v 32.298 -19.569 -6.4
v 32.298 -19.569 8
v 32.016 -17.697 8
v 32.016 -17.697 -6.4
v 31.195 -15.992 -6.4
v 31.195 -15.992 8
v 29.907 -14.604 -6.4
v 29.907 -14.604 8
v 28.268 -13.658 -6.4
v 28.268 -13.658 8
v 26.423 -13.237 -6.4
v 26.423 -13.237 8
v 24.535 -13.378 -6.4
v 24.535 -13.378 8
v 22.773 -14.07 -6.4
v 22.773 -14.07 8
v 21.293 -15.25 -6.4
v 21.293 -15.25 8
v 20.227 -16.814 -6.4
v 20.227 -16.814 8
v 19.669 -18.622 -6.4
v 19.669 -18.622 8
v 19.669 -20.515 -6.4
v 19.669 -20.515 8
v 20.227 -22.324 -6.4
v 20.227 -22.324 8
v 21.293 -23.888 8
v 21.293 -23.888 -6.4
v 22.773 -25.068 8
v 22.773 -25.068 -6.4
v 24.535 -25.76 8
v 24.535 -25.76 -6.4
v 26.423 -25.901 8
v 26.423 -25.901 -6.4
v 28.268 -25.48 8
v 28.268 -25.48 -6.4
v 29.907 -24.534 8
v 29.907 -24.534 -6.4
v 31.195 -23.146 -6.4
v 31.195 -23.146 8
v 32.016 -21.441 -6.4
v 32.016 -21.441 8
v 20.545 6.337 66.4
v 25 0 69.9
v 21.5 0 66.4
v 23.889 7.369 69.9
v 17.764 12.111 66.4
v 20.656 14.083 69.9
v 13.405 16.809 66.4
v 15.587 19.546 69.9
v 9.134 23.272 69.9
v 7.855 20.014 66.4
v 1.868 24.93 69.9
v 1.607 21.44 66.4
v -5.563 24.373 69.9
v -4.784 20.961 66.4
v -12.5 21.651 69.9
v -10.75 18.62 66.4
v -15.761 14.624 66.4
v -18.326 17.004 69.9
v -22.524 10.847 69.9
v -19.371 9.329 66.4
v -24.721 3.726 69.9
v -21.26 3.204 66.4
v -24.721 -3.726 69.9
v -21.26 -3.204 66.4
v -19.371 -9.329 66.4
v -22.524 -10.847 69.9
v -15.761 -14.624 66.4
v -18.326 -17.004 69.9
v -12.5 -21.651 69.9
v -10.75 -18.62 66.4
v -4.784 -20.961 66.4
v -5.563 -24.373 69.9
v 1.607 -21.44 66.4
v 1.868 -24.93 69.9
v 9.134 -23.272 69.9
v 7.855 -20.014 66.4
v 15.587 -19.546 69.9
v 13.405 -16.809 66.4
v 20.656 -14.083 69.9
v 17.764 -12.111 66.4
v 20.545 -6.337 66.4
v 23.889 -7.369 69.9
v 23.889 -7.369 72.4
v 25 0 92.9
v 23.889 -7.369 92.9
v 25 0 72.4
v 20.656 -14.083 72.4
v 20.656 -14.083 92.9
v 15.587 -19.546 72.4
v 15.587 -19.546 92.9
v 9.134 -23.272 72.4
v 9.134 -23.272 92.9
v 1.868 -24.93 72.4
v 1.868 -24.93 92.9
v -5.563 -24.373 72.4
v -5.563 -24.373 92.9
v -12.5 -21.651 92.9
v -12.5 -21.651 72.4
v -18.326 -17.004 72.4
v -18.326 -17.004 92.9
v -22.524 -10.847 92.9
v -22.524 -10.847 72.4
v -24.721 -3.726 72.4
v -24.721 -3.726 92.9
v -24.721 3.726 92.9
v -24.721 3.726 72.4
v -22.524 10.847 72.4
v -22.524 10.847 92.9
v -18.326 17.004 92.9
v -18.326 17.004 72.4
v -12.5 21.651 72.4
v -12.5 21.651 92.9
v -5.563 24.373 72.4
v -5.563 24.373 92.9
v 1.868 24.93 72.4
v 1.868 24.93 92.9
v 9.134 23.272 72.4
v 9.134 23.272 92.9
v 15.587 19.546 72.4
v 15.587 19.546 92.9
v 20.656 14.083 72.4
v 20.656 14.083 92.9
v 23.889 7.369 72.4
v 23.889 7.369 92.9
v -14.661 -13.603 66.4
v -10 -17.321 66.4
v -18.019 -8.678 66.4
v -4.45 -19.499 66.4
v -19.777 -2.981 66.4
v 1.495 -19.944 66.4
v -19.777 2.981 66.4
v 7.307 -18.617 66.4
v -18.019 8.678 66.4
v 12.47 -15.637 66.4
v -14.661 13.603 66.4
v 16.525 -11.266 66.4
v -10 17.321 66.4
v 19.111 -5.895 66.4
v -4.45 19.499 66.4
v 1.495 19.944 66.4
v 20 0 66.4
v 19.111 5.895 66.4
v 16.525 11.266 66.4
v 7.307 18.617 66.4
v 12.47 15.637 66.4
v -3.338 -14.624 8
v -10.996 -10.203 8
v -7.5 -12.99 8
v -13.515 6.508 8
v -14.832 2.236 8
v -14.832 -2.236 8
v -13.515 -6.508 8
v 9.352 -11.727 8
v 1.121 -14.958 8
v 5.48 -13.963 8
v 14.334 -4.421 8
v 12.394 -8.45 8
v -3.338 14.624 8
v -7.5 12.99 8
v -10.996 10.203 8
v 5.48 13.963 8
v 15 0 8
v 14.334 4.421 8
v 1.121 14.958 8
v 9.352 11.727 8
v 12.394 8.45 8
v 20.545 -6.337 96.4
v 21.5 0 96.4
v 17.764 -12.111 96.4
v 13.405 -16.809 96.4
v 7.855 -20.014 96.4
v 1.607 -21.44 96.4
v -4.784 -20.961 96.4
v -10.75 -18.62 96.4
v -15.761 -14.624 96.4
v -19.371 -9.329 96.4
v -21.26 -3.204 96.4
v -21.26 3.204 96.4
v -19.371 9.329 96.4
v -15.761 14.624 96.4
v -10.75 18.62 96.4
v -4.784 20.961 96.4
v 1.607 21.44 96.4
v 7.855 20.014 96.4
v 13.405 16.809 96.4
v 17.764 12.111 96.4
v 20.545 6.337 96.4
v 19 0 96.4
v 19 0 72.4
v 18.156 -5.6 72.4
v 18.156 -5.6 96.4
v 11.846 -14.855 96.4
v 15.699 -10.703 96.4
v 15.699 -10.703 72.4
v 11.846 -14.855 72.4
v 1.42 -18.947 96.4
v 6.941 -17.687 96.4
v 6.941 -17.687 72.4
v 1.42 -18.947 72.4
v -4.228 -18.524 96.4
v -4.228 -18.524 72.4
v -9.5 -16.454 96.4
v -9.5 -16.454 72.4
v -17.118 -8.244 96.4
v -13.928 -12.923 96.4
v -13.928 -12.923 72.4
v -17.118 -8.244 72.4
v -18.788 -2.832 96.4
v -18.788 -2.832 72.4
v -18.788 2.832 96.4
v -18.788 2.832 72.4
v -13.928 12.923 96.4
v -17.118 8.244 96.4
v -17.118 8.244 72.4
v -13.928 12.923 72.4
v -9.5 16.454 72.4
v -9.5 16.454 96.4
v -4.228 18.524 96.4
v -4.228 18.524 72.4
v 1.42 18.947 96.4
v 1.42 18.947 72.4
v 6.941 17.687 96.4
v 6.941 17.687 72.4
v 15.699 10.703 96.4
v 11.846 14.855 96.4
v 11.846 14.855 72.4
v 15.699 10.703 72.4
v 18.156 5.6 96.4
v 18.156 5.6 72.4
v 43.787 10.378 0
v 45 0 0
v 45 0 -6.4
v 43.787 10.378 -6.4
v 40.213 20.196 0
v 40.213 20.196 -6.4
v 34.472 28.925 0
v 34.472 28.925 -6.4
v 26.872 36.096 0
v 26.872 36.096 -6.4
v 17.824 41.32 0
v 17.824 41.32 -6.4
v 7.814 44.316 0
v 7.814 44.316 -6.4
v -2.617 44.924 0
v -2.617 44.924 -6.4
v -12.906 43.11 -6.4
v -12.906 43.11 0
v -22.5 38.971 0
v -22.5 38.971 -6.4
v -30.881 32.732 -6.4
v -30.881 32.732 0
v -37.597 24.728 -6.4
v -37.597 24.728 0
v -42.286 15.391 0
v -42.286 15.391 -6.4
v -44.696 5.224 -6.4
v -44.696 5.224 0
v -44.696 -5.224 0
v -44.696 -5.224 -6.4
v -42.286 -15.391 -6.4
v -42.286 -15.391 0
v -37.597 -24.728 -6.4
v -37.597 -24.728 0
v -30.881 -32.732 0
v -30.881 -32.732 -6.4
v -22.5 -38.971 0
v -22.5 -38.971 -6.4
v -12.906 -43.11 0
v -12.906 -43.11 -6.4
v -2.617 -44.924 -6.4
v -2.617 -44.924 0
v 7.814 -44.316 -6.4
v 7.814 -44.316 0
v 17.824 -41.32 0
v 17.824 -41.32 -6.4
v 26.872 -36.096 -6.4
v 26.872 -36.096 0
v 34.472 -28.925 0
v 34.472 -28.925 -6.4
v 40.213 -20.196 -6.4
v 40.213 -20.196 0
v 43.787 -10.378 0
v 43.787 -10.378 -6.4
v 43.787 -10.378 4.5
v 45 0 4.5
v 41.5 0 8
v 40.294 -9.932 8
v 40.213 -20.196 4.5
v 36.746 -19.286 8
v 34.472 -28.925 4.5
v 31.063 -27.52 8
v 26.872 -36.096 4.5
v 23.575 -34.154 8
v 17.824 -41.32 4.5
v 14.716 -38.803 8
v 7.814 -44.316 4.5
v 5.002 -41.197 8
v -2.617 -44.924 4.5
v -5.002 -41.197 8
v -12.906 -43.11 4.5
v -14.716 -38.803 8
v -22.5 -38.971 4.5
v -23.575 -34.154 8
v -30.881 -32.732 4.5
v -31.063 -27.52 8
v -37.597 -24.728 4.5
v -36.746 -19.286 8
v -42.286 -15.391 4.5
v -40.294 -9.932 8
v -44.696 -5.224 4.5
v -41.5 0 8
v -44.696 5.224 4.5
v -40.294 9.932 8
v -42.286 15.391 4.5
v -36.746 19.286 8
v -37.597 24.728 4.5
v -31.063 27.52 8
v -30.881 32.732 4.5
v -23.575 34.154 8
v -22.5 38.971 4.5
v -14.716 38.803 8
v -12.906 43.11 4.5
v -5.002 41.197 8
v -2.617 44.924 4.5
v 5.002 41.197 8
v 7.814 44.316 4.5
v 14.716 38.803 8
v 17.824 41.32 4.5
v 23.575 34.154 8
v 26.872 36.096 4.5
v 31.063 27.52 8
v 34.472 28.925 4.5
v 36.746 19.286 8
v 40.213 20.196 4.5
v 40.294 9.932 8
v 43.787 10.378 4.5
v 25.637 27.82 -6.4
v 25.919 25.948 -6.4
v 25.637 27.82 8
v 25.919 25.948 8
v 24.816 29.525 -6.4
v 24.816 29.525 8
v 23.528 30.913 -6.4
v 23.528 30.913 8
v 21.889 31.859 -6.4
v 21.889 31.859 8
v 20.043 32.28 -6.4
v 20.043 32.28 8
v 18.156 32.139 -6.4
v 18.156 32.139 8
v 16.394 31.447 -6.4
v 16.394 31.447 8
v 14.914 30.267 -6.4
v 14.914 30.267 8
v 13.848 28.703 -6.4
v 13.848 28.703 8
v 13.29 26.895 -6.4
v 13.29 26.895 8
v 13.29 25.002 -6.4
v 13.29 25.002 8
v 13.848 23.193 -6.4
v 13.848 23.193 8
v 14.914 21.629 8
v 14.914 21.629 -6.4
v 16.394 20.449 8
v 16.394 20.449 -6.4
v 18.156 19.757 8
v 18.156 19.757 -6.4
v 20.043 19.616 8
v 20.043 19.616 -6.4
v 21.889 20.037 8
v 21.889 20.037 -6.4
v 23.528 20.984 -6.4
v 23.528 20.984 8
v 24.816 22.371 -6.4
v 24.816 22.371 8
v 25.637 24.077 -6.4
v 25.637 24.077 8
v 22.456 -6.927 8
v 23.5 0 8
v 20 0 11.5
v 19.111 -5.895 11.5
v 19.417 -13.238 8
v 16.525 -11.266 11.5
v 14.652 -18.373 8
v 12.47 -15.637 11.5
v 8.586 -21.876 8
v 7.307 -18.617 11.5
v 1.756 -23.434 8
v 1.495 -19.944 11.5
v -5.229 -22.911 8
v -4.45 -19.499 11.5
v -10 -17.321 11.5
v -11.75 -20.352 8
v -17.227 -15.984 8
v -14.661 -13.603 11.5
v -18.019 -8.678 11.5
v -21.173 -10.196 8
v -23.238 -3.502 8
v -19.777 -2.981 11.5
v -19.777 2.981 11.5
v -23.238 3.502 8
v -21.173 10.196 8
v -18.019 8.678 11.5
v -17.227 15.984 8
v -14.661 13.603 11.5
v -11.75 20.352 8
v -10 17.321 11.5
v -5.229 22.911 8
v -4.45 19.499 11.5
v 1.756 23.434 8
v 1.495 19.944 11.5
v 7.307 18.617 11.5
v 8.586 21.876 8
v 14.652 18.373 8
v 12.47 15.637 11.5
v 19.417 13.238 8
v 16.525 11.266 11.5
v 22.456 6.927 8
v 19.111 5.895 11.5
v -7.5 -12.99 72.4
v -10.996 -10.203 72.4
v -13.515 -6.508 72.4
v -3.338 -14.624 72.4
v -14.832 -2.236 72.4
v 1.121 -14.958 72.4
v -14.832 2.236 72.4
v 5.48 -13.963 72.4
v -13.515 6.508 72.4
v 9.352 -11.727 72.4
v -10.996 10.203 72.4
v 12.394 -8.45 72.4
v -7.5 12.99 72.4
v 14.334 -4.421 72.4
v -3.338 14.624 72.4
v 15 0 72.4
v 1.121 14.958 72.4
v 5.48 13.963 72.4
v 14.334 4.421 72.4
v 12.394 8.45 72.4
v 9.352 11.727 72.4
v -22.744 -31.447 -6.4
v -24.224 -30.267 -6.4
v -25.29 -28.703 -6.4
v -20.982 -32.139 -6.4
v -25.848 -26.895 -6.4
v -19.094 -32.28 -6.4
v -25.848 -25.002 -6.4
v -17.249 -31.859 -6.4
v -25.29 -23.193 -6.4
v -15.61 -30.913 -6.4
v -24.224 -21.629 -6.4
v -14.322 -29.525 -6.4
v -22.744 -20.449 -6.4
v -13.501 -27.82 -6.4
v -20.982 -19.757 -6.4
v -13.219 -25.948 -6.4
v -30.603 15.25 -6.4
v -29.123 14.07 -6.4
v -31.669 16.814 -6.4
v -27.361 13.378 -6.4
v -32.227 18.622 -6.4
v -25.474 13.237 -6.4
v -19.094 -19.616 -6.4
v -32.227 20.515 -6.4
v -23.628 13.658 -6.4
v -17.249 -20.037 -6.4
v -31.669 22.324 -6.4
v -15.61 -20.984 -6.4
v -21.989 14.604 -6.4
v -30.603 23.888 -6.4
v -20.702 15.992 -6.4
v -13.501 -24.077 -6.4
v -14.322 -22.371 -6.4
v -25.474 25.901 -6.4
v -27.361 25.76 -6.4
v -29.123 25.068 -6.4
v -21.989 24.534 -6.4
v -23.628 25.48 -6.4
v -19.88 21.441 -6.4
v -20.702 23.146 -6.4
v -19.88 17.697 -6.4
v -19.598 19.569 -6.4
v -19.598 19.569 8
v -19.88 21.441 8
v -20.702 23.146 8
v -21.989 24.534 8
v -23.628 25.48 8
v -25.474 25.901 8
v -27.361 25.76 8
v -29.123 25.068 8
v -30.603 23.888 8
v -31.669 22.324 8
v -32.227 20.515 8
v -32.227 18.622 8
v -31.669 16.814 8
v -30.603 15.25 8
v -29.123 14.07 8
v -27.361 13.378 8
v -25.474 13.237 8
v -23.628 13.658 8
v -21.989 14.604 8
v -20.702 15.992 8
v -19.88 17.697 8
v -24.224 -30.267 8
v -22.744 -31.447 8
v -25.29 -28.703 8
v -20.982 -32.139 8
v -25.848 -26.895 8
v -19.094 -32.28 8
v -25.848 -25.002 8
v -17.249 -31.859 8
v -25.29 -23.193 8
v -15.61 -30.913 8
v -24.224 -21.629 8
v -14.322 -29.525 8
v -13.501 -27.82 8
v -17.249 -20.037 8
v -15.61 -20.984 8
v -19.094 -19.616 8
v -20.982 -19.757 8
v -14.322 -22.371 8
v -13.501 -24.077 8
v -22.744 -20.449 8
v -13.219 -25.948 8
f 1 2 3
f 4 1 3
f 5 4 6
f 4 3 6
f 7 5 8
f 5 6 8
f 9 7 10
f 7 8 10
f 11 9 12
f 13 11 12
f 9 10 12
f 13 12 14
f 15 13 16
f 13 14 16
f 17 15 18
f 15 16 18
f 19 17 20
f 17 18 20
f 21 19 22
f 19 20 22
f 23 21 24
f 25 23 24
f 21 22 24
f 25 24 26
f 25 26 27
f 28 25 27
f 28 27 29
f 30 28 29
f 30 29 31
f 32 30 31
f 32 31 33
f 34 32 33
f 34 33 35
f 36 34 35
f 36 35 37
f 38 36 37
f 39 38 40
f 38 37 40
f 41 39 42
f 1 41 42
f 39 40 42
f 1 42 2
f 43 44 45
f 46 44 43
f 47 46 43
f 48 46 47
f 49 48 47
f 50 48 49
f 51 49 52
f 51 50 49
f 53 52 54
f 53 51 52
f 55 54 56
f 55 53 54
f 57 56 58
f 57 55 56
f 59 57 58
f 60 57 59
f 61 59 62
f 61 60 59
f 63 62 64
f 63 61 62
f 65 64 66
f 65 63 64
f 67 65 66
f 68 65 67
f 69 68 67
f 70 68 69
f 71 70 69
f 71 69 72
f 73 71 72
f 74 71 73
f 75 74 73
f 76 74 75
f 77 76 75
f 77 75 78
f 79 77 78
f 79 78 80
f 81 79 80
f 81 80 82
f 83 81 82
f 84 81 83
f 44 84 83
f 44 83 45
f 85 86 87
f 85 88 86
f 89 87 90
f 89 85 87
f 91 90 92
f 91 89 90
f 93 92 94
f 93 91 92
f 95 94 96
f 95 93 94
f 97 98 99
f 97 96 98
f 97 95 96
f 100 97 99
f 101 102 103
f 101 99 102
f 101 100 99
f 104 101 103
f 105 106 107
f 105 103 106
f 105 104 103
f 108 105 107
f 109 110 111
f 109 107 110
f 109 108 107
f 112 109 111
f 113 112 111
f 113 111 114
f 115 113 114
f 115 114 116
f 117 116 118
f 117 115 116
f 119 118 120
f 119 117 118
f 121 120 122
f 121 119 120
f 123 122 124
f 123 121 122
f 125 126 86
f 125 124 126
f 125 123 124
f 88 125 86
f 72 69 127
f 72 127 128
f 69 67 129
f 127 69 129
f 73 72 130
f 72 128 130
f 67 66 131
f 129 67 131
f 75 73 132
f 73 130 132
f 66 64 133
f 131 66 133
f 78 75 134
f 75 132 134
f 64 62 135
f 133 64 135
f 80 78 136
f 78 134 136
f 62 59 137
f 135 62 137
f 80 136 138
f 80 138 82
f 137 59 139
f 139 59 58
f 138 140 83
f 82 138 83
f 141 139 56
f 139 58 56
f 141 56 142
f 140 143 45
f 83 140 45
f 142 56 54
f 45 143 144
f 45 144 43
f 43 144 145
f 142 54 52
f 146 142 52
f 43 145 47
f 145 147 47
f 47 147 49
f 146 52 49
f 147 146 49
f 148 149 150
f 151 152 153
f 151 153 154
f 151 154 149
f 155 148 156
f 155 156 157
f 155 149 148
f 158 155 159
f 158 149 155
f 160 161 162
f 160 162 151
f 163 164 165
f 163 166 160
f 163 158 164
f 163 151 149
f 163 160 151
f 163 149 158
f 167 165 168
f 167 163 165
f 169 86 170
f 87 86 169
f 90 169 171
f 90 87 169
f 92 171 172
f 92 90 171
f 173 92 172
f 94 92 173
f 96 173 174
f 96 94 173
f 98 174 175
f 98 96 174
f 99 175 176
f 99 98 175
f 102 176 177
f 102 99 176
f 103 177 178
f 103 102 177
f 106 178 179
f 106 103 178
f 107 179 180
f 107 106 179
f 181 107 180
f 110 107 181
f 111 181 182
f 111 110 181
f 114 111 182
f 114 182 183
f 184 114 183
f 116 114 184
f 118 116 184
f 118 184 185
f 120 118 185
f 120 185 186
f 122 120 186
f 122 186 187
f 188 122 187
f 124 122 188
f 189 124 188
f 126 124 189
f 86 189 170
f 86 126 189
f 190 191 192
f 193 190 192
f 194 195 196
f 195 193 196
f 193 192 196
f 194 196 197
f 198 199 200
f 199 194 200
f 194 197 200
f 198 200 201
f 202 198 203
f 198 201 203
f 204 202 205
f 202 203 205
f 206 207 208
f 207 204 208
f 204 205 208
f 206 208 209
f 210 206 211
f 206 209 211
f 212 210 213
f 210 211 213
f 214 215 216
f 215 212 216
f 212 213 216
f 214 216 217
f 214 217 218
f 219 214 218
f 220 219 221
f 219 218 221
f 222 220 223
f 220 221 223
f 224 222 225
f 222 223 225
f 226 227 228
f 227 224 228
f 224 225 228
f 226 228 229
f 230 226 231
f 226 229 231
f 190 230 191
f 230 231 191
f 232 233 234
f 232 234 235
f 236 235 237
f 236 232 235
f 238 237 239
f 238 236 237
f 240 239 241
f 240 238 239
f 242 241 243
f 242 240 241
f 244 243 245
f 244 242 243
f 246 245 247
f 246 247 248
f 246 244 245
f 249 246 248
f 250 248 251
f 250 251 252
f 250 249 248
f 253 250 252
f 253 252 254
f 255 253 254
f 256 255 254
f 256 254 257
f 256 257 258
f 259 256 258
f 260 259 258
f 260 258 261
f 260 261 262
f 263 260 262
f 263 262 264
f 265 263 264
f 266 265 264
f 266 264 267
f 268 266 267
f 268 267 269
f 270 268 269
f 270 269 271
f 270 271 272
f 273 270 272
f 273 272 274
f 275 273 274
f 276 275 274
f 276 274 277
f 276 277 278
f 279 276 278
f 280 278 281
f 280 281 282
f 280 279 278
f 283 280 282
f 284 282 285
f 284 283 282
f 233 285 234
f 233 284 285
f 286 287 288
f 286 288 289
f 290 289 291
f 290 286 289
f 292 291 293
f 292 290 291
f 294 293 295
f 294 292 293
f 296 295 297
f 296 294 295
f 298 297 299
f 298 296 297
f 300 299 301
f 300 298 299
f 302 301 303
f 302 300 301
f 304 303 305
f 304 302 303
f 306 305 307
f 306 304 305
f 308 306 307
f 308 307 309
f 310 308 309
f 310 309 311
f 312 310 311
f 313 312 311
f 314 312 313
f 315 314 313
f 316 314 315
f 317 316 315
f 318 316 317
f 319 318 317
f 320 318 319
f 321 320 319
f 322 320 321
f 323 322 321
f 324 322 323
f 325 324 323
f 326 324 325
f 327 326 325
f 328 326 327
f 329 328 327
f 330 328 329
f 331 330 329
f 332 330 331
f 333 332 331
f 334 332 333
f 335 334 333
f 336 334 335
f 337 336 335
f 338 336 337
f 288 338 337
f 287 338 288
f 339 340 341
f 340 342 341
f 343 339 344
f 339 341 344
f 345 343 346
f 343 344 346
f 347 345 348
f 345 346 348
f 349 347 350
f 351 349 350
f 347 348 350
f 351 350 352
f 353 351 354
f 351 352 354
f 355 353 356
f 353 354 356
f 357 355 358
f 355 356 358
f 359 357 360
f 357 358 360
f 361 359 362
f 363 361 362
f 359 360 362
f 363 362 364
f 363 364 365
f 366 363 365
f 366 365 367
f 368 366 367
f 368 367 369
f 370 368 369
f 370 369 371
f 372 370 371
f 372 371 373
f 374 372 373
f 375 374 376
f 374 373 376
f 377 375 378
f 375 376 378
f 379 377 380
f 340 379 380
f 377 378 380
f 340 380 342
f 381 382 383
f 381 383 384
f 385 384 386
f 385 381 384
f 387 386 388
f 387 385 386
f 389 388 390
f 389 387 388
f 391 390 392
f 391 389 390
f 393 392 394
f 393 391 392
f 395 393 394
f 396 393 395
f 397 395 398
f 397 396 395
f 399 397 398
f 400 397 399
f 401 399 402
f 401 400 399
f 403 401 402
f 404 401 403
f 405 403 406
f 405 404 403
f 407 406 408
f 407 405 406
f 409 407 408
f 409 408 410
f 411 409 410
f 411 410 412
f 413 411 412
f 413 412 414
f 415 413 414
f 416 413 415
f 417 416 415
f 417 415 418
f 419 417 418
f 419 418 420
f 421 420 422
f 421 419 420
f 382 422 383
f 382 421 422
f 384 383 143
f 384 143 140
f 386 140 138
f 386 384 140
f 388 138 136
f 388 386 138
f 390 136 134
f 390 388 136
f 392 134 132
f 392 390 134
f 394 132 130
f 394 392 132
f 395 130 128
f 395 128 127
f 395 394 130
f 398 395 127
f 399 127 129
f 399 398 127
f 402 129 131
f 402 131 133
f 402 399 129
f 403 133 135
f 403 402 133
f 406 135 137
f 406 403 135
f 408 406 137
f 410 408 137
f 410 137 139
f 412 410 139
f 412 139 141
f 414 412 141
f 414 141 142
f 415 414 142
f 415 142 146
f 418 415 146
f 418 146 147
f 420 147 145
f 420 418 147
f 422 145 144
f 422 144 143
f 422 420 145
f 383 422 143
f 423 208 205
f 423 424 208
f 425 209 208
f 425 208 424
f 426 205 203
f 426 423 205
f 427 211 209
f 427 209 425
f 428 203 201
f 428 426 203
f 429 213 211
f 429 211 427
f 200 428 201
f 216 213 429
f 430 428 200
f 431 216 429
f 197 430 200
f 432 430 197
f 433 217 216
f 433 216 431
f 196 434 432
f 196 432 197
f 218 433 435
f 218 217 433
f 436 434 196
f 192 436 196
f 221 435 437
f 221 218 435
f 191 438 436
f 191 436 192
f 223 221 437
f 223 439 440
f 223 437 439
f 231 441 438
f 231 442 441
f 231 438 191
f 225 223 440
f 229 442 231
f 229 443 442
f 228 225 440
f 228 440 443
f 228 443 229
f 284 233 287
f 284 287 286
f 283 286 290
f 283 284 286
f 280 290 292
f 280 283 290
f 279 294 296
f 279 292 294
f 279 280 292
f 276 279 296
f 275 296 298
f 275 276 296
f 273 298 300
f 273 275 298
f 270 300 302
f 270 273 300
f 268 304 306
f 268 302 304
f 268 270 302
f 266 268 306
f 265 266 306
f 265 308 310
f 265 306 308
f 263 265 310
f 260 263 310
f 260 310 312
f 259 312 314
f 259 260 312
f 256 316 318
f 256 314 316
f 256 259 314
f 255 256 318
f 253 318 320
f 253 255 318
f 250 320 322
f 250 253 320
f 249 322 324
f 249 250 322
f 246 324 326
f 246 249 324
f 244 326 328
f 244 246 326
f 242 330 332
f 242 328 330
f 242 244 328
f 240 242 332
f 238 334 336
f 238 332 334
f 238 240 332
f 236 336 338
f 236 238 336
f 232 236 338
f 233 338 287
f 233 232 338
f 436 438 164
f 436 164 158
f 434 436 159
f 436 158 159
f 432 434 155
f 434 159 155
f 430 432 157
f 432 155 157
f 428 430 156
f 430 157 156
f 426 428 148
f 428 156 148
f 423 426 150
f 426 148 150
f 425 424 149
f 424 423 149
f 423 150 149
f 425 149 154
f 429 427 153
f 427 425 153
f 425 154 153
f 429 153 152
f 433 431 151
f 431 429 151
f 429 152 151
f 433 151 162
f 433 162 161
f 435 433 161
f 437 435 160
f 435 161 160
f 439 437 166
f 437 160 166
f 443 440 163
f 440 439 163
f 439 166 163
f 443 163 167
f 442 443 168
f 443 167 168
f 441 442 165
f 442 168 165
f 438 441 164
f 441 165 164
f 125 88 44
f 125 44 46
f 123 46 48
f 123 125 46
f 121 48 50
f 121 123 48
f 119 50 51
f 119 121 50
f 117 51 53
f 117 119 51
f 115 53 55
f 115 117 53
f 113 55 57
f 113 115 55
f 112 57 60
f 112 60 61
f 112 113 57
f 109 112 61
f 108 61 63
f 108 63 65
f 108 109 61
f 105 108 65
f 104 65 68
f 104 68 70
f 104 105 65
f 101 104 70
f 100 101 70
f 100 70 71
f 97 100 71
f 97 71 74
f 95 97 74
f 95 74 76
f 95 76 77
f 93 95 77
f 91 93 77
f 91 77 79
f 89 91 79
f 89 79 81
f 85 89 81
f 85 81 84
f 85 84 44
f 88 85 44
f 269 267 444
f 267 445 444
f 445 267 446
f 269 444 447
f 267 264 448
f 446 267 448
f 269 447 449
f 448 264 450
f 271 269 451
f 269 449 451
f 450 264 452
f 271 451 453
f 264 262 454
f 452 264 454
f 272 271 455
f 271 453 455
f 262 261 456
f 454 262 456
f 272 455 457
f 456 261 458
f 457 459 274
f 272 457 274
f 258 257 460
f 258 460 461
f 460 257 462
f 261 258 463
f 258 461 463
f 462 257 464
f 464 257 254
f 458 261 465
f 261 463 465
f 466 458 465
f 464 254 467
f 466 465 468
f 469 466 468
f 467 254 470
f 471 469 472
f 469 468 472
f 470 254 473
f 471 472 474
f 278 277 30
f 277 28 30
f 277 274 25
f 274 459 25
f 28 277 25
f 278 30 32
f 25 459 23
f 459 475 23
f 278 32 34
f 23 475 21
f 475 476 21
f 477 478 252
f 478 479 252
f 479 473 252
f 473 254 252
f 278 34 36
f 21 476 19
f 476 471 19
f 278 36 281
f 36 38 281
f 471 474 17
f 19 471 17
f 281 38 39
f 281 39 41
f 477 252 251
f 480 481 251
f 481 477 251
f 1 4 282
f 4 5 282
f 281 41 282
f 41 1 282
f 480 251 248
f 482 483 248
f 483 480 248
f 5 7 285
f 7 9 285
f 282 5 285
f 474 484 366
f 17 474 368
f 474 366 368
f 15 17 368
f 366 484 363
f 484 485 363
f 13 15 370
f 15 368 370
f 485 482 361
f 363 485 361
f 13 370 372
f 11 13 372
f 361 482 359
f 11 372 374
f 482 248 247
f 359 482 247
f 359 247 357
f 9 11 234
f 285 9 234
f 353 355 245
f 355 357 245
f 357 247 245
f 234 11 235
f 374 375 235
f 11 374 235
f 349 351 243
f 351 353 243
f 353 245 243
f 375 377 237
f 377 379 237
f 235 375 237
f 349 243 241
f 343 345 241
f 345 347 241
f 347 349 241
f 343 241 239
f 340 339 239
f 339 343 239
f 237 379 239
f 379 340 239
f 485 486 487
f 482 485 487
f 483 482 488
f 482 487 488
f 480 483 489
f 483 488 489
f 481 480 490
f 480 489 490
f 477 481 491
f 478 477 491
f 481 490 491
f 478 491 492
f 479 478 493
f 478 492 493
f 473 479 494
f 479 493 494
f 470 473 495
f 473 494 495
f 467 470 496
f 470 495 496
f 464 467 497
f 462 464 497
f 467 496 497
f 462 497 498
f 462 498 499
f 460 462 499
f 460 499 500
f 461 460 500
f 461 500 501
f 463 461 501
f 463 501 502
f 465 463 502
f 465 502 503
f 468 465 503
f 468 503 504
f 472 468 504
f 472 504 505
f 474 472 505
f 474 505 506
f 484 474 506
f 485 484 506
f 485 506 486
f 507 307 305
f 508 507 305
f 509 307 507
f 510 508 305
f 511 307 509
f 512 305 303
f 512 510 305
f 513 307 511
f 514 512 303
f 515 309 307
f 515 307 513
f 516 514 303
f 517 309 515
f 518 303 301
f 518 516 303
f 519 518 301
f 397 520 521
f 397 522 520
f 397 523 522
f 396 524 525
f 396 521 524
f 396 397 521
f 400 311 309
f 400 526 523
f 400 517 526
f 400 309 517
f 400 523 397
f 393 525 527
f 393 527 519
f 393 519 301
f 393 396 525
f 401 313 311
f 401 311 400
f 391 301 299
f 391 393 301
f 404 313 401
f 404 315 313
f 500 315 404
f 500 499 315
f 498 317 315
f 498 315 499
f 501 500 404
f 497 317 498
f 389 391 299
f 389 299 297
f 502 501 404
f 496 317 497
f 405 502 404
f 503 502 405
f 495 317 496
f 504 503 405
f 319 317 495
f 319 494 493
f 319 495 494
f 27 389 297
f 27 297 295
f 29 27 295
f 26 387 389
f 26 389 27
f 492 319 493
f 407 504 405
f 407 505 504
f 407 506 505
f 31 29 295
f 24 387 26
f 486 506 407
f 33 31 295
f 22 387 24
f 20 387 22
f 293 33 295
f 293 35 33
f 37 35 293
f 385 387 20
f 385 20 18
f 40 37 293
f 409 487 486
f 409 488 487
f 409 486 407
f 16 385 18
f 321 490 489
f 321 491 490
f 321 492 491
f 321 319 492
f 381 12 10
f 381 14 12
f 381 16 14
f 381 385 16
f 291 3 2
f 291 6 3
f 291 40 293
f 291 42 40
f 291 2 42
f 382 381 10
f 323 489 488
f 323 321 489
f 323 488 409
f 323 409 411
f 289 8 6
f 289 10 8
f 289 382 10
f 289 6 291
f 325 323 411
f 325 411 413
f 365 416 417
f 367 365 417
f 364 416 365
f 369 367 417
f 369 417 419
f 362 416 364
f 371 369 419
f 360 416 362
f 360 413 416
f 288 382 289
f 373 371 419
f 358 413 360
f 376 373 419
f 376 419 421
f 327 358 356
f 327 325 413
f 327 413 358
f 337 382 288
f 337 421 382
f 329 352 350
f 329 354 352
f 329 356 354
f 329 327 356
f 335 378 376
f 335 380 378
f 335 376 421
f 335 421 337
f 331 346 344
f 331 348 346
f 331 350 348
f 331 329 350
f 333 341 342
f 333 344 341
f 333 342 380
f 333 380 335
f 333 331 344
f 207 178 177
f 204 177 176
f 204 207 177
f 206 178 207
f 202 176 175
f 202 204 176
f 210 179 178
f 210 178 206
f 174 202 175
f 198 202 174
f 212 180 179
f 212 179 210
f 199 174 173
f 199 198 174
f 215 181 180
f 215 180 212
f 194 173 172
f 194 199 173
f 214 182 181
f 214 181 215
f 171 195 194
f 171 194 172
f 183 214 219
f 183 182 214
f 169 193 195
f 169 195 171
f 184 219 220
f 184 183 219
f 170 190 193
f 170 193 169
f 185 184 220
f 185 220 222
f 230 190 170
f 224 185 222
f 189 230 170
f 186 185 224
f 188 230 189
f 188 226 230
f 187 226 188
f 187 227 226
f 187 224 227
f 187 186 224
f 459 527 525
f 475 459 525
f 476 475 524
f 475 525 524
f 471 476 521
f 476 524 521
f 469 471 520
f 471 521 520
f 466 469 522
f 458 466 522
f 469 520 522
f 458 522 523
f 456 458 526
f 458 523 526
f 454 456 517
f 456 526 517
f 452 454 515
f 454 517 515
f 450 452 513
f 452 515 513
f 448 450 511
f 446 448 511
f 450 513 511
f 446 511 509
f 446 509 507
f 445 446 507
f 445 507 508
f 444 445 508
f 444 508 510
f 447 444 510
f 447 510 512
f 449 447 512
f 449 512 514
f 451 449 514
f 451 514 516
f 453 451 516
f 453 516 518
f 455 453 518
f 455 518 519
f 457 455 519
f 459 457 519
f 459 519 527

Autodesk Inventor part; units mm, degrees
ref_plane "YZ Plane" through (0, 0, 0) normal (1, 0, 0) x (0, 1, 0)
ref_plane "XZ Plane" through (0, 0, 0) normal (0, 1, 0) x (-1, 0, 0)
ref_plane "XY Plane" through (0, 0, 0) normal (0, 0, 1) x (1, 0, 0)
sketch "Sketch1" plane through (0, 0, 0) normal (0, 0, 1) x (1, 0, 0)
  line L0 (-438.4859, 117.5453) -> (-265.3275, 117.5453) construction
  line L1 (-265.3275, 117.5453) -> (-265.3275, -22.5902) construction
  line L2 (-265.3275, -22.5902) -> (-438.4859, -22.5902) construction
  line L3 (-438.4859, -22.5902) -> (-438.4859, 117.5453) construction
  circle A0 centre (0, 0) radius 45
  dimension "d3" = 90
extrude "Extrusion1" add sketch "Sketch1" along normal blind 8 and the other way blind 6.4
sketch "Sketch2" plane through (0, 0, 8) normal (0, 0, 1) x (1, 0, 0)
  circle A0 centre (19.5689, 25.9482) radius 6.35
  circle A1 centre (-25.9482, 19.5689) radius 6.35
  circle A2 centre (-19.5689, -25.9482) radius 6.35
  circle A3 centre (25.9482, -19.5689) radius 6.35
  point P0 (0, 0)
  dimension "d7" = 12.7
  dimension "d8" = 32.5
  dimension "d11" = 360
extrude "Extrusion2" cut sketch "Sketch2" against normal through all
sketch "Sketch3" plane through (0, 0, 8) normal (0, 0, 1) x (1, 0, 0)
  circle A0 centre (0, 0) radius 20
  circle A1 centre (0, 0) radius 15
  dimension "d16" = 40
  dimension "d17" = 30
extrude "Extrusion3" add sketch "Sketch3" along normal blind 64.4
sketch "Sketch4" plane through (0, 0, 72.4) normal (0, 0, 1) x (1, 0, 0)
  circle A0 centre (0, 0) radius 25
  circle A1 centre (0, 0) radius 15 projected
  circle A2 centre (0, 0) radius 19
  dimension "d20" = 50
  dimension "d21" = 38
extrude "Extrusion4" add sketch "Sketch4" along normal blind 24 and the other way blind 6 contours A0
chamfer "Chamfer1" distance 3.5 angle 45 1 edges at (-20, 0, 8)
chamfer "Chamfer2" distance 3.5 angle 45 1 edges at (-25, 0, 96.4)
chamfer "Chamfer3" distance 3.5 angle 45 1 edges at (-25, 0, 66.4)
chamfer "Chamfer4" distance 3.5 angle 45 1 edges at (-45, 0, 8)
properties part number "cad@23"
